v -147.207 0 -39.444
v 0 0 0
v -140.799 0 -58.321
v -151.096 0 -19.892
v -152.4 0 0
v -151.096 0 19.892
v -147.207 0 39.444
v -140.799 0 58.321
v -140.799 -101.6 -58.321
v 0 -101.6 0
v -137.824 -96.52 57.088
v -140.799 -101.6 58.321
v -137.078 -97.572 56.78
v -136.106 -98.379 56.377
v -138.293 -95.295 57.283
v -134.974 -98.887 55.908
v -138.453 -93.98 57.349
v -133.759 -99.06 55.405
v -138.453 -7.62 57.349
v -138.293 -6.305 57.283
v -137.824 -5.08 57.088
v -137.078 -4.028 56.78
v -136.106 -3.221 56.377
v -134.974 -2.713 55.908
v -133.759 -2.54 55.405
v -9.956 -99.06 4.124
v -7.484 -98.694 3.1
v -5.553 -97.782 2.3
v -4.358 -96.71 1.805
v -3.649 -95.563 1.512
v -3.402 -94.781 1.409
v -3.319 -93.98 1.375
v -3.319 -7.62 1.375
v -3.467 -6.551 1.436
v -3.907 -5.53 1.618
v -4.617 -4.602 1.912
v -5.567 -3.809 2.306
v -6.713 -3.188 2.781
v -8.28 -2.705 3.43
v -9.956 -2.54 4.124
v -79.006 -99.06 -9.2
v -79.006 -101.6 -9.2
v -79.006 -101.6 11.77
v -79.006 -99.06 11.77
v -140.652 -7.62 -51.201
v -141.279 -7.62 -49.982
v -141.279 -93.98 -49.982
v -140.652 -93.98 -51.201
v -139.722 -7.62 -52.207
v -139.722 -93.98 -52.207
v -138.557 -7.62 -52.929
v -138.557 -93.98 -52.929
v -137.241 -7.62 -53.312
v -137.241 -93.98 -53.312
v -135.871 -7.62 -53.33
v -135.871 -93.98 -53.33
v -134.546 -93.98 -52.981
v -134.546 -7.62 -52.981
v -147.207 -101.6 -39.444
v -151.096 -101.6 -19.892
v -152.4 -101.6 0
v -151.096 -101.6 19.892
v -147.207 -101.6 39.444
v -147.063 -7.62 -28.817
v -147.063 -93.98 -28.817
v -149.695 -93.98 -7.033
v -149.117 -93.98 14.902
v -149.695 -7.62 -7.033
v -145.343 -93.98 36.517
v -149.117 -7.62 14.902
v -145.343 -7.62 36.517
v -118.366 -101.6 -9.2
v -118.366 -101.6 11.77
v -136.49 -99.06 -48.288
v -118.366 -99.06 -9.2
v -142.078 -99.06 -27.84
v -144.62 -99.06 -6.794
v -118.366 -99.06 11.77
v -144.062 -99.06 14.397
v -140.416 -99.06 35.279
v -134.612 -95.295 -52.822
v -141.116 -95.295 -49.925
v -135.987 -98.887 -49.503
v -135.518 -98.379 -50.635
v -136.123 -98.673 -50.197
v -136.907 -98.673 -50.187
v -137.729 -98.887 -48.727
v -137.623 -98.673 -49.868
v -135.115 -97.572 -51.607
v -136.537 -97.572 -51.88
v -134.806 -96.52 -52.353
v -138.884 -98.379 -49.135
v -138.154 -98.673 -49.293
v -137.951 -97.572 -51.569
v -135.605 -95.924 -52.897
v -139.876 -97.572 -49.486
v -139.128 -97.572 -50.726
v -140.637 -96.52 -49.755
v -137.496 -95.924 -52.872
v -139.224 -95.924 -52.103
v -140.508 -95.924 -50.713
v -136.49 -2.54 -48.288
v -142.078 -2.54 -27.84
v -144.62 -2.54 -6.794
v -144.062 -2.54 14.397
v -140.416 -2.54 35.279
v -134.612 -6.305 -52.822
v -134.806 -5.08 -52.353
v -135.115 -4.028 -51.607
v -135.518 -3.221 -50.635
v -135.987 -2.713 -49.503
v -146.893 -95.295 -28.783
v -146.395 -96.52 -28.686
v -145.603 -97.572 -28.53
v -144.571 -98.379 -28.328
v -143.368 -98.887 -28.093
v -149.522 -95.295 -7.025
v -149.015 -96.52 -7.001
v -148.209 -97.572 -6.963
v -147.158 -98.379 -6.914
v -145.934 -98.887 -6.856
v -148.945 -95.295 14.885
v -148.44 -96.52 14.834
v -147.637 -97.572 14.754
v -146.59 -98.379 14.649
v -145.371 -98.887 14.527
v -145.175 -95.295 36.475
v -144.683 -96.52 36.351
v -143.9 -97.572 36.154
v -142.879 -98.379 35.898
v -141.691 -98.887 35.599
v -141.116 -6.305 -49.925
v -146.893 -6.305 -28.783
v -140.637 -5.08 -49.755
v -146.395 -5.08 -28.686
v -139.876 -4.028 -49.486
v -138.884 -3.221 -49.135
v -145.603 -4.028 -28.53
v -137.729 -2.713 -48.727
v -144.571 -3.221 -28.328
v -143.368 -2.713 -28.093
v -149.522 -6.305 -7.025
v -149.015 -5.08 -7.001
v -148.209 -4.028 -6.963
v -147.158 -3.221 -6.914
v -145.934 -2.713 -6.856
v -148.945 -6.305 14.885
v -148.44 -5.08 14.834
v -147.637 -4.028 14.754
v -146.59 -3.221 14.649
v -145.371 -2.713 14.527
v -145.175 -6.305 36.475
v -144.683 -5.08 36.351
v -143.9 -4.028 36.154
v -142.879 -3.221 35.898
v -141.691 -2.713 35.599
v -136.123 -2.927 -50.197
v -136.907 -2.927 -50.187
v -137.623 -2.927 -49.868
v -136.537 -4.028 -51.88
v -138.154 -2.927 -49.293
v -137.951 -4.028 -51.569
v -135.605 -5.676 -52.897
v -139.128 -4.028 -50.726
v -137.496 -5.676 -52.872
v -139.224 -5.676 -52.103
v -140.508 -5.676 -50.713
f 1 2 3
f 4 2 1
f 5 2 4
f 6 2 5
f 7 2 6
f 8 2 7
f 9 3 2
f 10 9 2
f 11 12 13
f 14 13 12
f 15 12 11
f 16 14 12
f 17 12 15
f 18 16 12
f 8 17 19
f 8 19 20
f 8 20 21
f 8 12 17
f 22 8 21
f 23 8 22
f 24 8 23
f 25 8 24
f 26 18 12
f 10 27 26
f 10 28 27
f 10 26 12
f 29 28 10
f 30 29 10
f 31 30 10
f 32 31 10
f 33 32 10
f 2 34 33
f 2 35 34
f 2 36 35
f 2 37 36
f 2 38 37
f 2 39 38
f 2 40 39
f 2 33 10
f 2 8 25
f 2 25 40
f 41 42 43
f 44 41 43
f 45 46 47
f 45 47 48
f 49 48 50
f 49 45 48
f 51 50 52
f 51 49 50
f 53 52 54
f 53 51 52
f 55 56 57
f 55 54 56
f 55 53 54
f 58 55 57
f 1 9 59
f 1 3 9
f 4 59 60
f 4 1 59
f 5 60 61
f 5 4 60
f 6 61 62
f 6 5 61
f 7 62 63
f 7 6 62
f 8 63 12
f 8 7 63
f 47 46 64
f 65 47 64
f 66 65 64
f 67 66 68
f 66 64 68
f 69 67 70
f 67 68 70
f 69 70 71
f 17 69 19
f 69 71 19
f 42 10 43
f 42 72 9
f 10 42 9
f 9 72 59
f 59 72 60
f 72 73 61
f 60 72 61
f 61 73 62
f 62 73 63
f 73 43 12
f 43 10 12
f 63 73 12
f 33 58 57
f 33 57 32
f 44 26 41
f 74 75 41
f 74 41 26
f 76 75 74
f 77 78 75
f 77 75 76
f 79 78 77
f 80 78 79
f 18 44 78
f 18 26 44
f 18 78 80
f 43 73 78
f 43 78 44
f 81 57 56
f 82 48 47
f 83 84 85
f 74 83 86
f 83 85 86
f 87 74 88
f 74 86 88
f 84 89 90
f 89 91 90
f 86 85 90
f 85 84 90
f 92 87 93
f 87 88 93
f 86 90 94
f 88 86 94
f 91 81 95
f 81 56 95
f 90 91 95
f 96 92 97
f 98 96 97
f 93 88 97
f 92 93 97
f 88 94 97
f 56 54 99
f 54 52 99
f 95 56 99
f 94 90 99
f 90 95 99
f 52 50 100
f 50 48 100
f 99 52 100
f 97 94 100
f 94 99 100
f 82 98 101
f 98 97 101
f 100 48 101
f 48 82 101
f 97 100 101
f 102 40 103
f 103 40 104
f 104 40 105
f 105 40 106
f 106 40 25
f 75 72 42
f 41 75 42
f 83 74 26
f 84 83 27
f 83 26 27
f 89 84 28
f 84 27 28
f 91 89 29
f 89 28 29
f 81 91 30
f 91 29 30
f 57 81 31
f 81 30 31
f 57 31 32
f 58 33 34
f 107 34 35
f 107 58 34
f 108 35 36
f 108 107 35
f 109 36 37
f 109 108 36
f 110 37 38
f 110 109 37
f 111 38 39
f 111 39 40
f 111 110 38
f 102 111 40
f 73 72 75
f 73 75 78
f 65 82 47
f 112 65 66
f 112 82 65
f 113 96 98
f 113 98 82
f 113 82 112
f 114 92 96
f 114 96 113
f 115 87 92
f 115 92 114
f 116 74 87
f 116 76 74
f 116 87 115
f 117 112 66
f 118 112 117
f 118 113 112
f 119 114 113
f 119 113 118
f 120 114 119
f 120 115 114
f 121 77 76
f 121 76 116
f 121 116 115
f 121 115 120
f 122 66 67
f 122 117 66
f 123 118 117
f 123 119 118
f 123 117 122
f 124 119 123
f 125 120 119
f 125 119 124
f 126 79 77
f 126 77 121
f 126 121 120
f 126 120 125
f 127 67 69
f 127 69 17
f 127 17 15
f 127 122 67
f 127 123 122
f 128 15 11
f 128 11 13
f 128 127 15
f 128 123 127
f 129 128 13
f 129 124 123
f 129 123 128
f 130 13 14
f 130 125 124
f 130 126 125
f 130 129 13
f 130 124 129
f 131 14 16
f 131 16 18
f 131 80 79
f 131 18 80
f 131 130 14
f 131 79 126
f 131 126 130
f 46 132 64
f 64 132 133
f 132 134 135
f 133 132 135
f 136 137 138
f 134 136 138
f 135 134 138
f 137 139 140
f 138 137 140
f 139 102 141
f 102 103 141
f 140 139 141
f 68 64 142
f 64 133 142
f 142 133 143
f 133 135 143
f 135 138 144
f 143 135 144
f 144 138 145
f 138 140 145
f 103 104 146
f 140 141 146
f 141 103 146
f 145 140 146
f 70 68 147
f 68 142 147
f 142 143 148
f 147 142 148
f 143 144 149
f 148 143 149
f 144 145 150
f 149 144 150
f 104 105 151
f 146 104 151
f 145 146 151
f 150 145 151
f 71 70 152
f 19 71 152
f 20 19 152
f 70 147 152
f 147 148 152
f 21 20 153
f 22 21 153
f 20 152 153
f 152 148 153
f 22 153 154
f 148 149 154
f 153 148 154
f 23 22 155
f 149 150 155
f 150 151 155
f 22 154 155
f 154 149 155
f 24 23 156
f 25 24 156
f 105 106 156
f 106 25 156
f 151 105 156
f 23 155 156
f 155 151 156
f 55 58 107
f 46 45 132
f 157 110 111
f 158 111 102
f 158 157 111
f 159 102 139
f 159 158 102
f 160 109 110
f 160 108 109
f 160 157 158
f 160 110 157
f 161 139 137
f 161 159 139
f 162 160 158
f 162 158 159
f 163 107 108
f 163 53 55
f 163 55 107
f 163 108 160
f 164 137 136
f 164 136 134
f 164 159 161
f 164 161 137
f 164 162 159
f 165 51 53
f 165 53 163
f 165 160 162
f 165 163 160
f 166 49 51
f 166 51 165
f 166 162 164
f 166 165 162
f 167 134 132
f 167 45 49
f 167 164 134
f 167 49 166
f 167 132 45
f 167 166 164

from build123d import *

# Parameters (mm, degrees)
F0_W          = 152.4
F0_H          = 101.6
F1_ANGLE_BACK = 22.5
F1_ANGLE      = 45
F2_T          = -2.54
F3_R          = 5.08
F4_W          = 39.3600463867
F4_H          = 20.9691906348
F5_DEPTH      = 25.4


with BuildPart() as f1:
    # F0 (on Top) → F1 (revolve)
    with BuildSketch(Plane.XY, mode=Mode.PRIVATE) as f1_sk:
        with Locations((-76.2, -50.8)):
            Rectangle(F0_W, F0_H)
    revolve(f1_sk.sketch.rotate(Axis((0, -50.8, 0), (0, 1, 0)), -F1_ANGLE_BACK), axis=Axis((0, -50.8, 0), (0, 1, 0)), revolution_arc=F1_ANGLE)

    # F2
    f2_openings = [f1.faces().sort_by_distance(p)[0] for p in [
        (-70.39962, -50.8, 29.160478),
    ]]
    offset(amount=F2_T, openings=f2_openings)

    # F3
    f3_edges = [f1.edges().sort_by_distance(p)[0] for p in [
        (-71.361692, -99.06, -26.809705),
        (-149.854618, -99.06, 1.270046),
        (-139.404714, -50.8, -54.994047),
        (-71.361692, -2.54, -26.809705),
        (-149.854618, -2.54, 1.270046),
    ]]
    fillet(f3_edges, radius=F3_R)

    # F4 (on face) → F5 (cut)
    with BuildSketch(Plane.XZ.offset(101.6)):
        with Locations((-98.6861884594, 1.2850291096)):
            Rectangle(F4_W, F4_H)
    extrude(amount=-F5_DEPTH, mode=Mode.SUBTRACT)


solid = f1.part
